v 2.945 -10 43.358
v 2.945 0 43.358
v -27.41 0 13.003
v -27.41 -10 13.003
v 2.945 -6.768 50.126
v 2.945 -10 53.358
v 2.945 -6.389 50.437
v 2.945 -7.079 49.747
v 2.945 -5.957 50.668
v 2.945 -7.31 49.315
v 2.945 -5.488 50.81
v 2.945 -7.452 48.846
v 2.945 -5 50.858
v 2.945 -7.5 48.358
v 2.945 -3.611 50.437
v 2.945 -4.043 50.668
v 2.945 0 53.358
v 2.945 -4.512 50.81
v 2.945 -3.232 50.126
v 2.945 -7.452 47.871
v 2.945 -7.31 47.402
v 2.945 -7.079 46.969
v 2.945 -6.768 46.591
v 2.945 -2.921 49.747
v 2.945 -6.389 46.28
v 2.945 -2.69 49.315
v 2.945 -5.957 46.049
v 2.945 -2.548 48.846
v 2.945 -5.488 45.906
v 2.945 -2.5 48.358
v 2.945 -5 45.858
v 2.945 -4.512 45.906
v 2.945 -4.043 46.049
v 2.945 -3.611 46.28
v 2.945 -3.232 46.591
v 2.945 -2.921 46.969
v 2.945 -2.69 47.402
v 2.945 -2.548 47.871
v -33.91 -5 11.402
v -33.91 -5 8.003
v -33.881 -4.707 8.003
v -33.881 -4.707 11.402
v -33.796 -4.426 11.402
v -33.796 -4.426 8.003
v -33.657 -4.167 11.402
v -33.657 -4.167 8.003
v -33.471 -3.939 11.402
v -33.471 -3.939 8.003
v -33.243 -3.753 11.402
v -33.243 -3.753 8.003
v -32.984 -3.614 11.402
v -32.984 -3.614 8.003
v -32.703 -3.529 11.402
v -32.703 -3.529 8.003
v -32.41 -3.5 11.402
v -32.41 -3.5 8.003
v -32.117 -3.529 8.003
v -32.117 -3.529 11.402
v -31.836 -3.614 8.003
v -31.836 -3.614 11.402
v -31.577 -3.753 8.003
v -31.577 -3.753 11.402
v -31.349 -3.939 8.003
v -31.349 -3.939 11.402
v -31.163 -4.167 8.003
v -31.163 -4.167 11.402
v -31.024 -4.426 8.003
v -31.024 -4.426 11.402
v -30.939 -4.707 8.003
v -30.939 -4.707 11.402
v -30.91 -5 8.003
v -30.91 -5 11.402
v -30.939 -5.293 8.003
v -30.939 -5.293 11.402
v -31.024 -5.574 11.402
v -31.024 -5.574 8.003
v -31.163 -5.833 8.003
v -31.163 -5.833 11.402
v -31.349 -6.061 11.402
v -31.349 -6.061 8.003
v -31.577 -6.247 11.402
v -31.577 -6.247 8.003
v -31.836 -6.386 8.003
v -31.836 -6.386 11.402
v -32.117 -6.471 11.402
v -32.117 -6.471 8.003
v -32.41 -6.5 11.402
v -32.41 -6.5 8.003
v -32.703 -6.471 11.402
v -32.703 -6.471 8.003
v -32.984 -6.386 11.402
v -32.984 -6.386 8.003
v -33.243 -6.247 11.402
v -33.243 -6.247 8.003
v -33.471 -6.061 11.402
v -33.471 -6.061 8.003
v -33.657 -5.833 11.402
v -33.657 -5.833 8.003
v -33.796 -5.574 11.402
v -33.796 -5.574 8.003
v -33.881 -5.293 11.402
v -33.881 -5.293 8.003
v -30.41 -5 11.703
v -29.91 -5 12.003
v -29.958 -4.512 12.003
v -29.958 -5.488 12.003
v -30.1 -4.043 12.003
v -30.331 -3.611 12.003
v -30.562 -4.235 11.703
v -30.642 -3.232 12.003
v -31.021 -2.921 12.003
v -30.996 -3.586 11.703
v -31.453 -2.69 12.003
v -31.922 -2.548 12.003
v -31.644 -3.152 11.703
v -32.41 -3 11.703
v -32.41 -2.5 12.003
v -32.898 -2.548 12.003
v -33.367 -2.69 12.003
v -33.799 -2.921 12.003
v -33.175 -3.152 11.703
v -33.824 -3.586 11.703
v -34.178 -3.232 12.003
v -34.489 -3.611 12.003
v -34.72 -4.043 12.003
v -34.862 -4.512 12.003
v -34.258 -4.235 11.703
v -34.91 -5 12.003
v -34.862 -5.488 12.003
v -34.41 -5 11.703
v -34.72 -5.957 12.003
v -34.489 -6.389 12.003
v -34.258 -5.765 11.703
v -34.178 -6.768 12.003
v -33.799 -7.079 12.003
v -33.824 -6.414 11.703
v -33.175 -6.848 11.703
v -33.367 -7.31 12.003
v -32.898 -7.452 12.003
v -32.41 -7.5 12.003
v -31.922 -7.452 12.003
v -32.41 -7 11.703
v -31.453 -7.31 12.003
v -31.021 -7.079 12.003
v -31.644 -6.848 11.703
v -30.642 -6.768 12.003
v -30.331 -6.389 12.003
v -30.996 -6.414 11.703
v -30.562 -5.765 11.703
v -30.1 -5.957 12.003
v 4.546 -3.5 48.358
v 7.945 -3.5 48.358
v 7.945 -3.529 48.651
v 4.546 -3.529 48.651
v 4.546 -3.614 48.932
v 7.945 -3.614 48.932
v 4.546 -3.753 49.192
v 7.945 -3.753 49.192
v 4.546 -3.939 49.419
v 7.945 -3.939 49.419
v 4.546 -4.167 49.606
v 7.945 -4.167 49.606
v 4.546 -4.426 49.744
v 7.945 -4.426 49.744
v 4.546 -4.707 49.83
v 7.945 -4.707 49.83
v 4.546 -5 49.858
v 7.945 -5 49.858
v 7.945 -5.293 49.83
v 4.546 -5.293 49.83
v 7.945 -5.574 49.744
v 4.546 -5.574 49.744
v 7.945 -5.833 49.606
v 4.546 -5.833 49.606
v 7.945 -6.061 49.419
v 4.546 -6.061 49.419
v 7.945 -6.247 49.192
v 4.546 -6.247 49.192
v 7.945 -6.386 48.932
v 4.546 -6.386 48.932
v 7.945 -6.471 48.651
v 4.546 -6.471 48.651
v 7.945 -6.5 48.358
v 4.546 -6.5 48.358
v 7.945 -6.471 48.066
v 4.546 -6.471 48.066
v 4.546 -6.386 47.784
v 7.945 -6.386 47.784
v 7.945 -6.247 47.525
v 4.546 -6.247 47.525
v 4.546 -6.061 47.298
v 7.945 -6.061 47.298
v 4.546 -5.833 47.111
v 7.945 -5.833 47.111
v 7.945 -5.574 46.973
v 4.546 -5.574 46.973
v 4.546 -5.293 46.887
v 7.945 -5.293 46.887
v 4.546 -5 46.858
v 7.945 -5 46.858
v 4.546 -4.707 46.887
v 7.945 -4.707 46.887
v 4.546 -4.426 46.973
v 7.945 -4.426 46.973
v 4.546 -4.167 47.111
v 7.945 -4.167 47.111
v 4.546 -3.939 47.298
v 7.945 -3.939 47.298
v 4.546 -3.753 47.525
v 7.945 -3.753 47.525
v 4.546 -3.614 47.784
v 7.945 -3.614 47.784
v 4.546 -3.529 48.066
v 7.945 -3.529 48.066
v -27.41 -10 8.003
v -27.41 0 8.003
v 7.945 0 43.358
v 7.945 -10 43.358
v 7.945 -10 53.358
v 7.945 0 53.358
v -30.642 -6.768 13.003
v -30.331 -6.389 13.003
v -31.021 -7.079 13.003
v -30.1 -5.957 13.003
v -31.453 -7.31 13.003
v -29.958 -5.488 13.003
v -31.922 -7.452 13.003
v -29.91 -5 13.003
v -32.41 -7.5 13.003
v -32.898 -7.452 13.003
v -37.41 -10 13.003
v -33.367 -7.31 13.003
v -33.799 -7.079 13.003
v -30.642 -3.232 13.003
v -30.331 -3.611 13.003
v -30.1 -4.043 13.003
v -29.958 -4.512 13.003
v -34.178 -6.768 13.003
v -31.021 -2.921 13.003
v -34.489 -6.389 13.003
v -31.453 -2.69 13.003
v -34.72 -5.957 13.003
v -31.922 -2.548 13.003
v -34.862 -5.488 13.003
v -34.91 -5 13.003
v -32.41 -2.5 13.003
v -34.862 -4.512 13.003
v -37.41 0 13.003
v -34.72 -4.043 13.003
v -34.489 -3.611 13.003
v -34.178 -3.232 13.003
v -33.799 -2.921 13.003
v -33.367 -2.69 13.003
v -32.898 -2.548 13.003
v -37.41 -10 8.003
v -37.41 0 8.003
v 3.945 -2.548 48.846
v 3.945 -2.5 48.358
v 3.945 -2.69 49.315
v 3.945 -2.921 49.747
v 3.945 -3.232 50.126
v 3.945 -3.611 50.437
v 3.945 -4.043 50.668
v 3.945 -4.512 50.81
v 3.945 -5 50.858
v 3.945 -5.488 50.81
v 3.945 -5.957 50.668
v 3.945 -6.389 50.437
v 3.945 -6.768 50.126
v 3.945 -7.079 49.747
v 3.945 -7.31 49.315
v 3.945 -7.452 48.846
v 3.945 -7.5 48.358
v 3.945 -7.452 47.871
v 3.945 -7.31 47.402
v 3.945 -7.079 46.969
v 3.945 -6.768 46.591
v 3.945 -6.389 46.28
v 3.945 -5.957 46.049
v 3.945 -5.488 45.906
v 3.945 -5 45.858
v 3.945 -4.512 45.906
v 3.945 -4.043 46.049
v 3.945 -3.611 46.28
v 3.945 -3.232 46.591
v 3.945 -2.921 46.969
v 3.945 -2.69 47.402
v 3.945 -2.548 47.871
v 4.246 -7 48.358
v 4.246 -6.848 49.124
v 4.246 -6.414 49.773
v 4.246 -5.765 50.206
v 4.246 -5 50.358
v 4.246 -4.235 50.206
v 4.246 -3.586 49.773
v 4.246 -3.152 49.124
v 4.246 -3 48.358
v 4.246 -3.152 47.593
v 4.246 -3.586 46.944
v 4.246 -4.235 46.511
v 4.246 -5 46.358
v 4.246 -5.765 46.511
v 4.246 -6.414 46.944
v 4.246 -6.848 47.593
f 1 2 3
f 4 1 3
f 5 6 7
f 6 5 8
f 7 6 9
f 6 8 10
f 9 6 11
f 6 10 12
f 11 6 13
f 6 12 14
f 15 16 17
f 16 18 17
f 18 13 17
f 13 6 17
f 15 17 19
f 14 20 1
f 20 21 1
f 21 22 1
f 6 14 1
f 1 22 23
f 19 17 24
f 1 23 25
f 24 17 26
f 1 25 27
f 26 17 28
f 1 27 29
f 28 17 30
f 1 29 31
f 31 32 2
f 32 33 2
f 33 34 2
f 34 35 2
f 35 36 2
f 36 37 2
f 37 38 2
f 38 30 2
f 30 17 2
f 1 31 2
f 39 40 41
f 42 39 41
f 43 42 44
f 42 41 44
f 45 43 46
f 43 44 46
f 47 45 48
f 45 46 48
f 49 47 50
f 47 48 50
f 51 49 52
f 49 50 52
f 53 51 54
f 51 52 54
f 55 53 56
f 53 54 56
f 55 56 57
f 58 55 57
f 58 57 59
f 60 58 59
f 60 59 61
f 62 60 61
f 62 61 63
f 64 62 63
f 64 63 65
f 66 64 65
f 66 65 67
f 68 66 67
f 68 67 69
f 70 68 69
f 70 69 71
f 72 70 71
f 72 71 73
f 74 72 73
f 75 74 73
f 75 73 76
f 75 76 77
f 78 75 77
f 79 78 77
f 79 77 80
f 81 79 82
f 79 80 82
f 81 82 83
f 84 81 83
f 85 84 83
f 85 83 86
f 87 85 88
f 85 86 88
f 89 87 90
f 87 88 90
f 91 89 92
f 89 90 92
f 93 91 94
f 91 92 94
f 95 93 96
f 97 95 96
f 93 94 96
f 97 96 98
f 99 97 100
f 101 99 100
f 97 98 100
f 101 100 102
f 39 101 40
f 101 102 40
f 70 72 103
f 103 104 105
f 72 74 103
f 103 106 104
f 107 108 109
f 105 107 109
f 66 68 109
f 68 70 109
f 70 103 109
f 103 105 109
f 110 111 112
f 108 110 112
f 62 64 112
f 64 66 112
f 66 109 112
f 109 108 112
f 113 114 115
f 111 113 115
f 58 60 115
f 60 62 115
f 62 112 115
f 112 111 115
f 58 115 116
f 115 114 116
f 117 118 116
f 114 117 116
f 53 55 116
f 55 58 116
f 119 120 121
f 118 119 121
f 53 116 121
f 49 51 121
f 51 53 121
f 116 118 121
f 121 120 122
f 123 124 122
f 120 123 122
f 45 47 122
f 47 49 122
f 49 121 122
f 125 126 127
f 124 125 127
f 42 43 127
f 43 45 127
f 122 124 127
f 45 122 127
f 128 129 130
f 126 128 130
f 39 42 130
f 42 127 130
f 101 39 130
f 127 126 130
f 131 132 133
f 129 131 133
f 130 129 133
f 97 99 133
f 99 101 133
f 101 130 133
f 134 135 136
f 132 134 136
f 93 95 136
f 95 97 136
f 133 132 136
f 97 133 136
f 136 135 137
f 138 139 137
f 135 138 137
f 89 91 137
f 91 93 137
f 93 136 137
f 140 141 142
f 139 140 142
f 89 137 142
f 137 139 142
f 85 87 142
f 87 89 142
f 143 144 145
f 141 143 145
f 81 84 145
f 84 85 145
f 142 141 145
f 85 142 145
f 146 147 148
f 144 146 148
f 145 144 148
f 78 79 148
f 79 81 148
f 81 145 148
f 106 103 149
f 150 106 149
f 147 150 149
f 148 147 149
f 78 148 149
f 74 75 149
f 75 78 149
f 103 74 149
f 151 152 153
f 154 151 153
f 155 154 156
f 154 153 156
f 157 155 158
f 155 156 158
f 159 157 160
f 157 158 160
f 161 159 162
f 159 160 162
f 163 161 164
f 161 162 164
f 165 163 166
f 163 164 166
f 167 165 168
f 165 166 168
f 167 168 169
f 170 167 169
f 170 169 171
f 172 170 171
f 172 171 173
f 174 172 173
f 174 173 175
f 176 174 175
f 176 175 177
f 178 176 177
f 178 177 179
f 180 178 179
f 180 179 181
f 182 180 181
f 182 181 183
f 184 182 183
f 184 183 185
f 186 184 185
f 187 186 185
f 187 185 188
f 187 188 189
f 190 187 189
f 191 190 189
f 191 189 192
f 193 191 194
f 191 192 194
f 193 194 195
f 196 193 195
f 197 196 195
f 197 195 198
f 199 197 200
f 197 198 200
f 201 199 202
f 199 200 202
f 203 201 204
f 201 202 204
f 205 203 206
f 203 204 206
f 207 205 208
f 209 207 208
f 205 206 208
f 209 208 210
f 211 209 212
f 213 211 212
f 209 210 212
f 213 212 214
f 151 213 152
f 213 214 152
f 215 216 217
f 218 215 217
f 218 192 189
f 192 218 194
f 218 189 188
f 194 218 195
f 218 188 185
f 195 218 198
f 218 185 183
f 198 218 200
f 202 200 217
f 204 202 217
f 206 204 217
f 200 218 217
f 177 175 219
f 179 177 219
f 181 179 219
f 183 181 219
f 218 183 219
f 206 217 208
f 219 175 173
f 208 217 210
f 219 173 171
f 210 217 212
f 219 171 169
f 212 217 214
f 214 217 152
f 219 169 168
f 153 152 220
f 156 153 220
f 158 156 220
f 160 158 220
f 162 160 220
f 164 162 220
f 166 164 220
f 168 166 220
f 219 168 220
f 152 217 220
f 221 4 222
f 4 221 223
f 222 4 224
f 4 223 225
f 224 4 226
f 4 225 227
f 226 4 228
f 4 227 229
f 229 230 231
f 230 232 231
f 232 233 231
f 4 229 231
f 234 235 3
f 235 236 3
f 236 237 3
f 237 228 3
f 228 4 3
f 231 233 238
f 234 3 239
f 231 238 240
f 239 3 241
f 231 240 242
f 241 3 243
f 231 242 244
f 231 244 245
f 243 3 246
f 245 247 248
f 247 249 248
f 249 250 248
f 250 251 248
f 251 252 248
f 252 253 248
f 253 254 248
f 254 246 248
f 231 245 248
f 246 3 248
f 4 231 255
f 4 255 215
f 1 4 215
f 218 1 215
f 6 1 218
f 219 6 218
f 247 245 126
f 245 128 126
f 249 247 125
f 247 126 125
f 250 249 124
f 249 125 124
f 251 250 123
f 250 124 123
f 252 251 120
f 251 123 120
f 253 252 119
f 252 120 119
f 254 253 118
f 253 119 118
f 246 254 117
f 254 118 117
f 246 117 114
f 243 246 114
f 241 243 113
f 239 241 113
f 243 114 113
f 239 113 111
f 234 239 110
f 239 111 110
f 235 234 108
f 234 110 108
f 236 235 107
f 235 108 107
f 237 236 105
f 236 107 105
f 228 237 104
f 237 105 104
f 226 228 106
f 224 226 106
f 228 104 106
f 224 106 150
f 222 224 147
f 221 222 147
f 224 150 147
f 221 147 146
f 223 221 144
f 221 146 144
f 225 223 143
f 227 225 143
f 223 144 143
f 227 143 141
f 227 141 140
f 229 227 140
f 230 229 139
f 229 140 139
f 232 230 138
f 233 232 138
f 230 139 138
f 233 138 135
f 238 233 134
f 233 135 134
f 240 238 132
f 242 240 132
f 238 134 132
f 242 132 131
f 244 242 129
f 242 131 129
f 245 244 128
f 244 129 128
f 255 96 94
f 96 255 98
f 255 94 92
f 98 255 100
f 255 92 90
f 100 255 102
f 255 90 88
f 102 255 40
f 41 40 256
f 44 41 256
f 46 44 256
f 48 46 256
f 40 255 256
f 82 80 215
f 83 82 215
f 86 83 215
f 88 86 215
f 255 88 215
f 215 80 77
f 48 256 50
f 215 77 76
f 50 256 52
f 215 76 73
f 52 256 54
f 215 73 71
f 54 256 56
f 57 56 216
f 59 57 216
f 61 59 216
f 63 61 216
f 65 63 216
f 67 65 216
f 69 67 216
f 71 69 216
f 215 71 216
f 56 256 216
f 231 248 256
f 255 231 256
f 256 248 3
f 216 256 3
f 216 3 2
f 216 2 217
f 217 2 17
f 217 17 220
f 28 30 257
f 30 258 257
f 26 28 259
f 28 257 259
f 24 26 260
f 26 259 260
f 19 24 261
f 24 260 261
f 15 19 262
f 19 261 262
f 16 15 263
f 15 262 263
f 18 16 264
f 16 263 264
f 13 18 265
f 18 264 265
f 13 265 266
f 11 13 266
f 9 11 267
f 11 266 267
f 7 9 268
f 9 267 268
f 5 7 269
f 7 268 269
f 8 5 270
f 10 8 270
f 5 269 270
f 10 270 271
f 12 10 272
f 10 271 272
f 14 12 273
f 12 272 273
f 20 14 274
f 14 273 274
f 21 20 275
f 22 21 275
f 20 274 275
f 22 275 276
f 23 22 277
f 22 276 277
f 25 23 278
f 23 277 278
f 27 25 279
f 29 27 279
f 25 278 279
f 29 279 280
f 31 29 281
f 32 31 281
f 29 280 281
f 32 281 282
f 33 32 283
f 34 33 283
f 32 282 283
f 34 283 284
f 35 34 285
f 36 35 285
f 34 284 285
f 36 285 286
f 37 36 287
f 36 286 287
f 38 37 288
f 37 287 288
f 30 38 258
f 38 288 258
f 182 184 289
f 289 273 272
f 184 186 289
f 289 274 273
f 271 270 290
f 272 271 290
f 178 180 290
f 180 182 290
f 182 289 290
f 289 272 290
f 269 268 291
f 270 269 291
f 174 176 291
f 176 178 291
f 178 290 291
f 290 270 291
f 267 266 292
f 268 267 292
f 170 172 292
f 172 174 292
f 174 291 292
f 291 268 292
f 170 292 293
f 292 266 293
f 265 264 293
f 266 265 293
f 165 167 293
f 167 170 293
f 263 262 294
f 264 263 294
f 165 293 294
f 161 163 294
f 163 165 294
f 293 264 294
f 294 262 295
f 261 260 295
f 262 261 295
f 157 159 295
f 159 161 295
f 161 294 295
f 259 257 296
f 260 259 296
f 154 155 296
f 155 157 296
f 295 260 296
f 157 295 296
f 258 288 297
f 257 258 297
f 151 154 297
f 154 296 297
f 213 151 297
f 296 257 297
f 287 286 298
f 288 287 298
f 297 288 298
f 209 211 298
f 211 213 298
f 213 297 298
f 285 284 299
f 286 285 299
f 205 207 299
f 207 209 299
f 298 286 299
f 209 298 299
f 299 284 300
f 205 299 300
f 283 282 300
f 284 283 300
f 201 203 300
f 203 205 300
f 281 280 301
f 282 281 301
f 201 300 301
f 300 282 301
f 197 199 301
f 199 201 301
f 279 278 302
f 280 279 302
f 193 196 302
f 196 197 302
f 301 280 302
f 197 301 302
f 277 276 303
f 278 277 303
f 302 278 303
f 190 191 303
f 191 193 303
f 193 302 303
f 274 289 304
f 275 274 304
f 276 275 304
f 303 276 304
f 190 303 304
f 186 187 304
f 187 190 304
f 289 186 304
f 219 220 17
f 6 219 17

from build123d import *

# Parameters (mm, degrees)
F1_DEPTH = 10
F3_D     = 5
F3_DEPTH = 1
F3_TIP   = 1.5021515476
F5_D     = 5
F5_DEPTH = 1
F5_TIP   = 1.5021515476
F7_D     = 3
F9_D     = 3


with BuildPart() as f1:
    # F0 (on Front) → F1 (new body)
    with BuildSketch(Plane.XZ):
        Polygon((7.9454735894, 53.3583245364), (2.9454735894, 53.3583245364), (2.9454735894, 43.3583245364), (-27.4098654699, 13.0029854771), (-37.4098654699, 13.0029854771), (-37.4098654699, 8.0029854771), (-27.4098654699, 8.0029854771), (7.9454735894, 43.3583245364), align=None)
    extrude(amount=F1_DEPTH)

    # F3
    with Locations(Plane(origin=(2.9454735894, 0, 0), x_dir=(0, -1, 0), z_dir=(-1, 0, 0))):
        with Locations((5, 48.3583245364)):
            Hole(F3_D / 2, depth=F3_DEPTH)
            with Locations((0, 0, -(F3_DEPTH + F3_TIP / 2))):  # 118° drill point
                Cone(0, F3_D / 2, F3_TIP, mode=Mode.SUBTRACT)

    # F5
    with Locations(Plane.XY.offset(13.0029854771)):
        with Locations((-32.4098654699, -5)):
            Hole(F5_D / 2, depth=F5_DEPTH)
            with Locations((0, 0, -(F5_DEPTH + F5_TIP / 2))):  # 118° drill point
                Cone(0, F5_D / 2, F5_TIP, mode=Mode.SUBTRACT)

    # F7 (through all)
    with Locations(Plane.XY.offset(13.0029854771)):
        with Locations((-32.4098654699, -5)):
            Hole(F7_D / 2)

    # F9 (through all)
    with Locations(Plane(origin=(2.9454735894, 0, 0), x_dir=(0, -1, 0), z_dir=(-1, 0, 0))):
        with Locations((5, 48.3583245364)):
            Hole(F9_D / 2)


solid = f1.part
